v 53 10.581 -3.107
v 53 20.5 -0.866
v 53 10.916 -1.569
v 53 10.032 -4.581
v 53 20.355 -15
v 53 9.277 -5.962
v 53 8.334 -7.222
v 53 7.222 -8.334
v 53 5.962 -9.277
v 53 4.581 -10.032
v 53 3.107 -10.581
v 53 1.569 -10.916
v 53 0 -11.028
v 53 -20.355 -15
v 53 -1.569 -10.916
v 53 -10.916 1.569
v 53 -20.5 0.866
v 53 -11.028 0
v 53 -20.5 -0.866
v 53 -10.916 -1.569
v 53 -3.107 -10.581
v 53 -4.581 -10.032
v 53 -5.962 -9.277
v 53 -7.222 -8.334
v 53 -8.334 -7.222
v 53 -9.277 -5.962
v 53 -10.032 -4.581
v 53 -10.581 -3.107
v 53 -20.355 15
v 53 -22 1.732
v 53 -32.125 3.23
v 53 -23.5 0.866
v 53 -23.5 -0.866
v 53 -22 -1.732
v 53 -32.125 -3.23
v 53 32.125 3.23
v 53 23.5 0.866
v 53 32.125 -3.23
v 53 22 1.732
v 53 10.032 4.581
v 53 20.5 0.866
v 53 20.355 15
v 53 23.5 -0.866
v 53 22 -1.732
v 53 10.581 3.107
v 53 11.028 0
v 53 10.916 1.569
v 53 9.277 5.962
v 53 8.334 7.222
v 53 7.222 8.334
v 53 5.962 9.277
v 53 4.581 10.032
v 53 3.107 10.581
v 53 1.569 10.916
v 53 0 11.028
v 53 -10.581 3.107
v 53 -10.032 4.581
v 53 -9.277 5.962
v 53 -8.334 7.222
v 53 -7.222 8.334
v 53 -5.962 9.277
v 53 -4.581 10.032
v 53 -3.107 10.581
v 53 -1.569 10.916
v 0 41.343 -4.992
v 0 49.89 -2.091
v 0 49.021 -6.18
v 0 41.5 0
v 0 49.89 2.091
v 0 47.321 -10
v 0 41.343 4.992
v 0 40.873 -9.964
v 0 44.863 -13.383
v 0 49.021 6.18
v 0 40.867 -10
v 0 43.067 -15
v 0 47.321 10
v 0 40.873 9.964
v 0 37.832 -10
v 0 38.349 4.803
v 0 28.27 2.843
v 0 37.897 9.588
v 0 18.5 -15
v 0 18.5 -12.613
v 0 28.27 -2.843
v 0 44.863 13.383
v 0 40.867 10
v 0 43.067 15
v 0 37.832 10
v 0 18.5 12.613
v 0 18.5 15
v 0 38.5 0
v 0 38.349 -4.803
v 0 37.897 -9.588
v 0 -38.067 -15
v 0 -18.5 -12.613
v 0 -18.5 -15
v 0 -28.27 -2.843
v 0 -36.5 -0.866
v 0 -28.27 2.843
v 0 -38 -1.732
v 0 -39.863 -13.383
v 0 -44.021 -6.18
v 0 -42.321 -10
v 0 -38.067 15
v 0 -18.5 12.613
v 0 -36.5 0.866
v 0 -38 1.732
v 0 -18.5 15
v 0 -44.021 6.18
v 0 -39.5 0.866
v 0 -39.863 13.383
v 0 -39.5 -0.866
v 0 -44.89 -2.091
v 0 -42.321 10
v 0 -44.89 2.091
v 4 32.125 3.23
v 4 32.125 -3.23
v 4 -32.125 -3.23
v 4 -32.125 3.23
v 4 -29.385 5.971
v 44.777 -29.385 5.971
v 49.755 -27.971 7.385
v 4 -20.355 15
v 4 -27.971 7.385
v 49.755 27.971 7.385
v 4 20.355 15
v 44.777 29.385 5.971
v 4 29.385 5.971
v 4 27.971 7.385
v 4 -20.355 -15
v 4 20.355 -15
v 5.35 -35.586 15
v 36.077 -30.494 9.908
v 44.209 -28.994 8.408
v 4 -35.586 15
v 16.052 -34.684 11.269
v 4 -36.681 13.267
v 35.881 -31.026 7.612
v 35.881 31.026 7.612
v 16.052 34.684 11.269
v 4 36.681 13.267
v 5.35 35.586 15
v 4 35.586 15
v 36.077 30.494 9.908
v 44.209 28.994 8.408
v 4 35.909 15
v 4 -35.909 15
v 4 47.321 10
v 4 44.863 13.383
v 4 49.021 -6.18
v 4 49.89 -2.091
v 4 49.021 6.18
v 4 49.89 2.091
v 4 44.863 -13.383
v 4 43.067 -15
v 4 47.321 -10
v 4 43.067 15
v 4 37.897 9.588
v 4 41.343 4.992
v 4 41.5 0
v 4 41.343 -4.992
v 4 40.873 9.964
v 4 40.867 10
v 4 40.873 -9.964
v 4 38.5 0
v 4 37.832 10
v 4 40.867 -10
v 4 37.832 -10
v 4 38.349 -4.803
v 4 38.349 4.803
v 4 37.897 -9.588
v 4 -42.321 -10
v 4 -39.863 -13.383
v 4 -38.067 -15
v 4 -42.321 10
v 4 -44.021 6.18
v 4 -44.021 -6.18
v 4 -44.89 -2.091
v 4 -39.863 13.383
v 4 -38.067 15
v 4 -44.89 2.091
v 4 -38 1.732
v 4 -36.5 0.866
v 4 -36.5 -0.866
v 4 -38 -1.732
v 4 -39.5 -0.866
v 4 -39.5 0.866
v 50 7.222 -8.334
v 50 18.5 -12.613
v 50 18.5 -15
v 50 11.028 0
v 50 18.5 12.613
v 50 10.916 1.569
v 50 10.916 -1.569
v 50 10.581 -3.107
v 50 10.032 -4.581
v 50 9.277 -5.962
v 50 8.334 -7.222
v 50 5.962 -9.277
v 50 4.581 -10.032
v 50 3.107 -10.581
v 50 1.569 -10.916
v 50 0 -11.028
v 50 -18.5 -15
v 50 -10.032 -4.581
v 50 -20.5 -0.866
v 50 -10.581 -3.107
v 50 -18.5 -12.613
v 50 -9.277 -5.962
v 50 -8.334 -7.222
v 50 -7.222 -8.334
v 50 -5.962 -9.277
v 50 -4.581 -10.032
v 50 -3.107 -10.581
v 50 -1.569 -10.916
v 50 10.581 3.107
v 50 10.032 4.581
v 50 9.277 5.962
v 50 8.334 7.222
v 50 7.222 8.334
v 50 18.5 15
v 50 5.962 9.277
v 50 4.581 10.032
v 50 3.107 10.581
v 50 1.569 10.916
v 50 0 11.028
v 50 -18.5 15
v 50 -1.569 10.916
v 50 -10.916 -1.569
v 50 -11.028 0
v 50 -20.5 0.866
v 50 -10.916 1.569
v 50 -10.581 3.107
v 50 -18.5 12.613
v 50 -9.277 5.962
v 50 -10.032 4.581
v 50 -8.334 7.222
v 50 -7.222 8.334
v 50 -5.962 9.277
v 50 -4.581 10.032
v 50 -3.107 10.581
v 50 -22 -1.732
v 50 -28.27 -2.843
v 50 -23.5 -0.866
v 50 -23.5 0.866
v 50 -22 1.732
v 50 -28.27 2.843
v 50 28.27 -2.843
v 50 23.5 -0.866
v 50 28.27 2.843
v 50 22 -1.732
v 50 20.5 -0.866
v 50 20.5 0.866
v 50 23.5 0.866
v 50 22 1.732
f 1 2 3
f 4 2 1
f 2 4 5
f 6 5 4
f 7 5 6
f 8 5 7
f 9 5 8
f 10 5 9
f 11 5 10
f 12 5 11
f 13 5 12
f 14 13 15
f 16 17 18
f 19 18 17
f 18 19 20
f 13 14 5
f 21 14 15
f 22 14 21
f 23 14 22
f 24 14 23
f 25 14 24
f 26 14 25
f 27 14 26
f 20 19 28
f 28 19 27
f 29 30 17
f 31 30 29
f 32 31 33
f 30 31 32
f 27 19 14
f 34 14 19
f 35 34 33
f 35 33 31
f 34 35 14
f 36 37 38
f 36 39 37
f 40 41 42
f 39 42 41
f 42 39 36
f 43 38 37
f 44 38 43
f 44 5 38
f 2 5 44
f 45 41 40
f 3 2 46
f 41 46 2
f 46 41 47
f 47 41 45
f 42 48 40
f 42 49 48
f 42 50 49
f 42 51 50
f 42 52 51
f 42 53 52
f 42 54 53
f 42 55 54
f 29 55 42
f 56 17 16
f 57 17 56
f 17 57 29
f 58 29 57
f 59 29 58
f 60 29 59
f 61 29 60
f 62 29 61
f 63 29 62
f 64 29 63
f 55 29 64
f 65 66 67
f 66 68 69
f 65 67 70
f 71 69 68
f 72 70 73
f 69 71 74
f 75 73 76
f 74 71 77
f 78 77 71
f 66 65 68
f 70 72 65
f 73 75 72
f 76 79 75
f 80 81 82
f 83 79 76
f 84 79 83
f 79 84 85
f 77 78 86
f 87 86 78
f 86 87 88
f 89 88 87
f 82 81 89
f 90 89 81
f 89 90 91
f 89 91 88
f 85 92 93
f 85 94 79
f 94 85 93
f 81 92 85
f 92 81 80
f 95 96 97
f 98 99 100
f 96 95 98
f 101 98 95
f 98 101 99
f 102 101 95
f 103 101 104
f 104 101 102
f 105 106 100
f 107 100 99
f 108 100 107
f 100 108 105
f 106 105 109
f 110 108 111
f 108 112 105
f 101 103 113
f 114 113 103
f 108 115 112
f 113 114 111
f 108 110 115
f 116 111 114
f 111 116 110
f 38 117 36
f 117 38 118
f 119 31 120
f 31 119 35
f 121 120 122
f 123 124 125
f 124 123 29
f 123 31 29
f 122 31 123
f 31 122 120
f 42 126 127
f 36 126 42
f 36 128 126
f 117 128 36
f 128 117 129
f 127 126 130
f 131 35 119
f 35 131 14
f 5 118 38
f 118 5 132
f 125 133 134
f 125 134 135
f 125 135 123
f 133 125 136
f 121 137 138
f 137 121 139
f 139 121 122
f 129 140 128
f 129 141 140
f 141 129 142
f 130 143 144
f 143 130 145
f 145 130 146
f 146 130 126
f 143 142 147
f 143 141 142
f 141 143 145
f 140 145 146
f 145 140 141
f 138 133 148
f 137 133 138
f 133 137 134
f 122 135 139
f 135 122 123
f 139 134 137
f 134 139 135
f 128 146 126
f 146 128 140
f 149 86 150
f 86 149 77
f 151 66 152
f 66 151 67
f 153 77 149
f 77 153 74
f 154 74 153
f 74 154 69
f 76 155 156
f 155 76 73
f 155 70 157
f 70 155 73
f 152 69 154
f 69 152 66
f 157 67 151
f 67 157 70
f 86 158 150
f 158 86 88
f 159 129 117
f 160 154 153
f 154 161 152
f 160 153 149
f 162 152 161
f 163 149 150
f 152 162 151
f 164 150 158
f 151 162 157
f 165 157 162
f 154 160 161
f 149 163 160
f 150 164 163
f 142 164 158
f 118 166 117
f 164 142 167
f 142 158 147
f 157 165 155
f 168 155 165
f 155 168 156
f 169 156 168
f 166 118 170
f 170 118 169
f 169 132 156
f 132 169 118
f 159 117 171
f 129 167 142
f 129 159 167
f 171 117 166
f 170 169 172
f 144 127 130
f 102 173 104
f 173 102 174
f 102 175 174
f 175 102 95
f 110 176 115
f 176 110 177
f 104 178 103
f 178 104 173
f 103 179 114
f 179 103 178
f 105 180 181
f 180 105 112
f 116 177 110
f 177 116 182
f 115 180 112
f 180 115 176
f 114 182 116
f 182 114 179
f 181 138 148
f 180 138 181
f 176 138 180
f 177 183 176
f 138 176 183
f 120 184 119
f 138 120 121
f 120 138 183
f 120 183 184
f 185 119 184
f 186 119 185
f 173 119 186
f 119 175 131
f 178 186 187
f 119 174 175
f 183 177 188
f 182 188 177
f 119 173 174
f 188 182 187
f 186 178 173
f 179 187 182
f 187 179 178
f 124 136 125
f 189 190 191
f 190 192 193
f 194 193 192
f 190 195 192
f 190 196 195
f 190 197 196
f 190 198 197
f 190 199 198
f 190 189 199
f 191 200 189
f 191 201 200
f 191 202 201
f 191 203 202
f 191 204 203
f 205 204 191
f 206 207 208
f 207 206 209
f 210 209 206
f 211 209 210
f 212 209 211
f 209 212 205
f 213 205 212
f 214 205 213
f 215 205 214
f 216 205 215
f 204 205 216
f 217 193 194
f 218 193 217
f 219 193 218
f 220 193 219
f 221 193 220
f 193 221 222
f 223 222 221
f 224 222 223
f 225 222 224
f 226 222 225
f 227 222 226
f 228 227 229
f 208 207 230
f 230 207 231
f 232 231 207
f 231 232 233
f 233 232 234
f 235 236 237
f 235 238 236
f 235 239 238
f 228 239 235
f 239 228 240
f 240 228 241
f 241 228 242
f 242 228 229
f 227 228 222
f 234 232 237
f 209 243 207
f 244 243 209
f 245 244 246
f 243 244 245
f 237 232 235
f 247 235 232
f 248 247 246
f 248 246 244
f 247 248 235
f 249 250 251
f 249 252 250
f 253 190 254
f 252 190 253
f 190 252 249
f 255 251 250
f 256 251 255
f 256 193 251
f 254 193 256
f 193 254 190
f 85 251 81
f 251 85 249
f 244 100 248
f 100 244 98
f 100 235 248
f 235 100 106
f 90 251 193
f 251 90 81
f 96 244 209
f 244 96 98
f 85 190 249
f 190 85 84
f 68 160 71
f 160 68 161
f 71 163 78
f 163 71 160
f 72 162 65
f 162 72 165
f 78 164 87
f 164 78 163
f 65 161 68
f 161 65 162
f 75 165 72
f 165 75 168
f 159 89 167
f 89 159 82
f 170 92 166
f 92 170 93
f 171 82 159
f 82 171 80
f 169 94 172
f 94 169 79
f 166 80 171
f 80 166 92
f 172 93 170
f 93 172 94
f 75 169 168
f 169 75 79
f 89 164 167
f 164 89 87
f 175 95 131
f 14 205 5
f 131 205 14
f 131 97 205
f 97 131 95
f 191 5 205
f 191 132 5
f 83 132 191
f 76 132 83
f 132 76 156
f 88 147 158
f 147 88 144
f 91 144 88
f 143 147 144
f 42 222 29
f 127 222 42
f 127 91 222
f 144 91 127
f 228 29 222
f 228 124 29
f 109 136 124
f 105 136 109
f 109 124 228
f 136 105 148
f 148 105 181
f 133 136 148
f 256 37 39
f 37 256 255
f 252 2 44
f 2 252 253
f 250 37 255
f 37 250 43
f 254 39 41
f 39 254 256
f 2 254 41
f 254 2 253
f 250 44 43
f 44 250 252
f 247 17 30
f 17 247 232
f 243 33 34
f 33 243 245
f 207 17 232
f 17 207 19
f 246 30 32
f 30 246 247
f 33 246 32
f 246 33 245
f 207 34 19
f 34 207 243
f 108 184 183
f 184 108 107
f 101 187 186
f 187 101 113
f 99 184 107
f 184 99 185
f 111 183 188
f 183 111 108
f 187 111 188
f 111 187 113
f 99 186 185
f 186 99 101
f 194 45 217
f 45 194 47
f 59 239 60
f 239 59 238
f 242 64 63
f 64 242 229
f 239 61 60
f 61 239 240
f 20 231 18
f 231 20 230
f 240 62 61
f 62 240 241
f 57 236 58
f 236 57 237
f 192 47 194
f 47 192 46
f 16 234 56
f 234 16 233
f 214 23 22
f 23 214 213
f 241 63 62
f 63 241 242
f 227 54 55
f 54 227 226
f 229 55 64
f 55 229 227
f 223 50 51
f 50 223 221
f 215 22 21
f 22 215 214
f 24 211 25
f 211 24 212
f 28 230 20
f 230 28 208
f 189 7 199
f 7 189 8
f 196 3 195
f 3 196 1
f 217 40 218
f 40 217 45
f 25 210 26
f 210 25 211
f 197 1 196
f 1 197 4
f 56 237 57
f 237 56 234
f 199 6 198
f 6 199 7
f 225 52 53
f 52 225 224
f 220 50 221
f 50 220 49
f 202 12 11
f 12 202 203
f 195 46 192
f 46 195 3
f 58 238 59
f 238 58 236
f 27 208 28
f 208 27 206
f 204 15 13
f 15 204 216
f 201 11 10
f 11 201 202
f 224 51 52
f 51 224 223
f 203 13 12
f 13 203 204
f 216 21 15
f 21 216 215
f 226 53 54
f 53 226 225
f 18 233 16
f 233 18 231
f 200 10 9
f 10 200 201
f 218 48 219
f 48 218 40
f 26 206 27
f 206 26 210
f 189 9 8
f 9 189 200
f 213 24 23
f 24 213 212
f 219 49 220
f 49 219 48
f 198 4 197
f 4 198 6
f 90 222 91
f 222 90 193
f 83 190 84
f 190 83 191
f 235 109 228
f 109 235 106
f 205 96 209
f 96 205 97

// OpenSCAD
//---------------------------------------------------------------------------------------------------
// RepRap "Morgan", main ver 1.20 - Single extruder version
// Copyright 2012, 2013. Author: Quentin Harley (qharley)
// This original design is licensed under GPLv2.
//
// These are the main SCARA arm components

include <MCAD/teardrop.scad>
include <MCAD/polyholes.scad>
include <MCAD/nuts_and_bolts.scad>

LMxUU = 8;				// Choose linear bearing: 8 or 12mm
rodspacing = 175;		// Distance between rods:	175 standard, 190 wide
PVC_pipe_OD = 32;		// Default 32mm
PVC_pipe_ID = 27.5;	// measure pipe ID to adjust
Drive_pipe_OD = 22.5;	// Drive pipe outter diameter: 22mm default
THREADLESS = false;	// True for use of threadless ball screw in z-bracket
SUPPORTED_ROD = true;	// Rods held by Z-mounts - False for platform mounted (lasercut)
Leadnut_thread = false;// Apply the thread of the leadscrew nut to the Z coupler

ENVELOPE_CHECK = false;

MakeMorgan(05);		// Select Part number to make	

//MorganEndstopZ();
//***********************************************************
//**                                                			**
//**    Select the number of the module to make				**
//**																		**
//**	01:	 PVC pipe support A (Ported, 458.5mm pipe)			**
//**	02:	 PVC pipe support B (non Ported, 451.5mm pipe)		**
//**	03: Z-mount Bottom												**
//**	04: Z-mount Top													**
//**	05: Motormount Short											**
//**	06: Motormount Tall											**
//**	07: Rod mounted Drivewheel									**
//**	08: Tube mounted Drivewheel									**
//**	09: 22mm Tube 6805 bearing adaptor							**
//**	10: Bed arm Left												**
//**	11: Bed arm Right												**
//** 	12:	 Bed Z-bracket and lead screw holder					**
//**	13: Bed rear mounting clips									**
//**	14: Bed front mounting clips									**
//**	15: hall-endstop holders										**
//**	16: Z-Lead screw motor shaft coupler						**
//**	17: Arm PSI A (inner supporting arm)						**
//**	18: Arm PSI B (outer supporting arm)						**
//**	19: Arm Theta A (inner steering arm)						**
//**	20: Arm Theta B (outter steering arm)						**
//**	21: Morgan Tool head (make from ABS/Nylon/etc)		**
//**	22: Lead screw nut (Alpen 8mm SDS)	
//**	23: extruder Bowden adaptor
//**  24: Belt anchor clip
//
//**  25: Morgan Line wheel (Rod mount)
//**  26: Morgan Line Wheel (Tube mount)				
//**
//**  TO DO!  Build Plates...
//**		Select number of build plate
//**	50: Arms Plate 		(PLA)
//**	51: Bed Plate 1		(PLA)
//**	52: Bed Plate 2		(PLA)
//**	55: Wheel PlateA	(PLA)
//**	56: Wheel PlateB	(PLA)
//**	60: Diverse Plate	(ABS)



module MakeMorgan(partnumber)
{
	if (partnumber == 1 ){
		MorganPVCsupport_ANG(PVC_pipe_ID,130,130,420, pipe = false, port=true);	// 458.47
	}
	if (partnumber == 2 ){
		MorganPVCsupport_ANG(PVC_pipe_ID,70,150,420, pipe = false);					// 451.44
	}
	
  rotate([0,0,45]){ 					// parts rotated through 45deg to ease fitting to RepRap heatbed


//MorganPillarMount();
//MorganShaftMount();
	if (partnumber == 3 ){
		if (SUPPORTED_ROD){
			MorganZmountBot(rodspacing, LMxUU);
		}
		else {
			MorganShaftMount();
		}		
	}
	if (partnumber == 4 ){
		if (SUPPORTED_ROD){
			MorganZmountTop(rodspacing, LMxUU);
		}
		else {
			MorganPillarMount();
		}	
		
	}

  }

	if (partnumber == 5 ){
		MorganMotorMount4(Height = 50);
	}
	if (partnumber == 6 ){
		mirror()
			MorganMotorMount4(Height = 70);
	}
	if (partnumber == 7 ){
		MorganBeltWheel();			// Rod mounted belt drive wheel
	}
	if (partnumber == 25 ){
		MorganLineWheel();			// Rod mounted line drive wheel
	}
	if (partnumber == 8 ){
		MorganBeltWheel2();			// Tube mounted belt drive wheel
	}
	if (partnumber == 26 ){
		MorganLineWheel2();			// Tube mounted line drive wheel
	}
	if (partnumber == 9 ){
		MorganPillar();				// 6805 bearing tube mount
	}
	
  rotate([0,0,45]){

	if (partnumber == 10 ){
		if(LMxUU == 12)
			MorganBedarmLeft(21.5);
		else
			MorganBedarmLeft(15.5);
	}
	if (partnumber == 11 ){
		if(LMxUU == 12)
			MorganBedarmRight(21.5);
		else
			MorganBedarmRight(15.5);
	}
	if (partnumber == 12 ){
		//Bed_stabil_bracket(21.5);
		if(LMxUU == 12)
			Bed_stabil_bracket(21.5);
		else
			Bed_stabil_bracket(15.5);
	}

  }

	if (partnumber == 13 ){
		BedMountRear();
	}
	if (partnumber == 14 ){
		BedMountFront();
	}
	
	if (partnumber == 15 ){
		MorganEndstop();
	}

	if (partnumber == 16 ){
		rotate([0,0,45])
			MorganZCoupler();
	}
	if (partnumber == 17 ){
		Primary_Arm();
	}
	if (partnumber == 18 ){
		Secondary_Arm();
	}
	if (partnumber == 19 ){
		Sup_Arm1();
	}	
	if (partnumber == 20 ){
		Sup_Arm2();
	}
	if (partnumber == 21 ){
		//Secondary_Arm_hotend_holder_mk2(Hotend_D = 16.5, Hotend_H = 12);
		Secondary_Arm_hotend_holder_mk2(Hotend_D = 16.5, Hotend_H = 12+25,mountpiece = true);
	}
	if (partnumber == 22 ){
		leadscrew_nut();
	}
	if (partnumber == 23 ){
		Extruder_Bowden_adaptor(support = false);
	}
	if (partnumber == 24 ){
		belt_clip();;
	}

	
//**************** Plates  ***************************

	if (partnumber == 50 ){
		translate([0,0,0])
			Primary_Arm();
		translate([0,35,0])
			Secondary_Arm();
		translate([0,-35,0])
			Sup_Arm1();
		translate([0,73,0])
			Sup_Arm2();
		
	}

	if (partnumber == 51 ){
		rotate([0,0,45]){
			translate([-13,0,0])
				if(LMxUU == 12)
					MorganBedarmLeft(21.5);
				else
					MorganBedarmLeft(15.5);

			translate([13,0,0])
				if(LMxUU == 12)
					MorganBedarmRight(21.5);
				else
					MorganBedarmRight(15.5);
		}

		translate([0,60,0])
			BedMountRear();
		translate([-40,150,0])
			rotate([0,0,180])
				BedMountRear();

		translate([-120,50,15/2])
			BedMountFront();
		translate([-120,20,15/2])
			BedMountFront();

	}


	if (partnumber == 60 ){
		translate([0,0,0])
			rotate([0,0,0])
				Secondary_Arm_hotend_holder(Hotend_D = 16.5, Hotend_H = 12);

		translate([70,-10,0])
			rotate([0,0,180])
				MorganPVCsupport_ANG(26.5,130,130,420, pipe = false, port=true);	// 458.47
	
		translate([-40,0,0])
			rotate([0,0,180])
				MorganPVCsupport_ANG(26.5,130,130,420, pipe = false, port=true);	// 458.47

		translate([-50,40,0])
			rotate([0,0,0])
				MorganPVCsupport_ANG(26.5,70,150,420, pipe = false);					// 451.44
		
		translate([-50,-70,0])
			rotate([0,0,0])
				MorganPVCsupport_ANG(26.5,70,150,420, pipe = false);					// 451.44

		translate([-70,-40,0])
			rotate([0,0,0])
				Extruder_Bowden_adaptor(support = false);

		translate([40,-35,0])
			rotate([0,0,0])
				import("../stl/cap_2.stl");

		translate([-40,-35,0])
			rotate([0,0,0])
				import("../stl/cap_2.stl");

		translate([-30,50,0])
			rotate([0,0,0])
				import("../stl/Eckstruder_Big_Gear_Herringbone.stl");

		translate([-16,-35,20])
			rotate([0,0,0])
				import("../stl/Eckstruder_Small_Gear_Herringbone.stl");

		translate([-50,-25,0])
			rotate([0,0,-90])
				import("../stl/Eckstruder_Idler_Block_for_Prusa.stl");

		translate([50,-65,0])
			rotate([0,0,0])
				import("../stl/thumb_knob_M4_extruder.stl");

		translate([10,110,0])
			rotate([0,0,-90])
				import("../stl/Eckstruder_Block_for_Prusa.stl");

	}

}





// **********************************************************
// **  Here be dragons...

//** print envelope check - only in F5 review
if(ENVELOPE_CHECK){
	translate([0,0,50])
		%cube([200,200,100], center=true);
}

module Matrix_test()
{
	for(x=[0:9])
	{
		for (y=[0:9])
		{
			translate([20*x,20*y,1.5])
				difference(){
					cube([20,20,3], center=true);
					cube([19,19,3],center=true);
				}
		}
	}	
}



PipeFactor = 40/39.2;			// Multiplication factor for inner diameter 

//MorganFrame();

pipeselect = false; // Show pipes in frame... default false


// ************** Building Blocks *************
// MorganPillarMount();
//	MorganShaftMount();
// MorganBedarm_mount();
//Bed_stabil_clasp();

// *****************8***********
//MorganMotorMount(50);
//MorganMotorMount(75);
//MorganFlatMotorMount();

module Dual_toohead()
{
	MakeMorgan(21);		// Select Part number to make	

	translate([150,0,0])
		rotate([0,0,12])
			translate([-150,0,0])
				rotate([0,0,90-(12/2)])
					Secondary_Arm_hotend_holder_2(Hotend_D = 16.5, Hotend_H = 12);
	translate([0,0,27])
		rotate([0,0,50])
			#MakeMorgan(20);
	translate([0,0,2])
		#MakeMorgan(18);
}

module leadscrew_profile()
{
	projection(cut=false){
		//polyhole(5,5);
		cylinder(r=3, h=5, $fn=24);
		cube([7.5, 3,1], center=true);
		rotate([0,0,-45])
			cube([6.5,3,1],center = true);
	}
}

module leadscrew_nut(){
	difference(){
		union(){
			cylinder(r=14.8/2,h=14, $fn=6);

		}
		linear_extrude(height = 120/4, center = true, twist = -360)
			scale(1.1)
				leadscrew_profile();
	}

}

module belt_clip($fn = 100)		// Adapted from code by WJ Harley
{
	difference()	{
		translate([0,0,0])	
			cylinder(10,30,30,0);
		union()
		{	
			translate([-17,-30,-1])
				cube([50,65,12]);
			translate([0,0,-0.2])	
				cylinder(12,r=27.5);
			translate([-35,-2,1.5])
				cube([30,4,7]);
		}
	}

	translate([-29,2,0])
		cube([12,2,10]);
	translate([-29,-4,0])
		cube([12,2,10]);
	translate([-22,2.5,0]){
		rotate(45,[0,0,1])
		cube([2,8,10]);
	}
	translate([-28,-8,0]){
		rotate(-45,[0,0,1])
		cube([2,8,10]);
	}
	translate([-17.5,2,0])	
		cylinder(10,0.5,0.5,0);
	translate([-17.5,-2,0])	
		cylinder(10,0.5,0.5,0);
}
		

		


module MorganEndstop()
{
	difference(){
		union(){
			cylinder(r=6, h=10);

			translate([9,0,1.5])
				minkowski(){
					cube([17,8,3],center=true);
					cylinder(r=2, h=0.00001, $fn=12);
				}

			translate([-5,1,5])
				rotate([90,0,0])
					minkowski(){
						cube([7,6,12],center=true);
						cylinder(r=2, h=2, $fn=12);
					}


		}

		translate([0,0,-1])
			polyhole(12,8);

		translate([-12,0,5])
			cube([20,8,12],center=true);

		translate([15,0,1])
			cube([4,5,2.1], center=true);
		translate([12,0,2.1])
			cube([4,5,2], center=true);

		translate([-6,10,5])
			rotate([90,0,0])
				polyhole(20,3);

		translate([-6,11,5])
			rotate([90,0,0])
				cylinder(r=3.1, h=5, $fn =6);



	}

}


module MorganEndstopZ()
{
	difference(){
		union(){
			cylinder(r=6, h=10);

			translate([8,0,0])
			  rotate([0,-90,0])
				difference(){
					translate([9,0,1.5])
						minkowski(){
							cube([17,8,3],center=true);
							cylinder(r=2, h=0.00001, $fn=12);
						}

					translate([15,0,1])
						cube([4,5,2.1], center=true);
					translate([12,0,2.1])
						cube([4,5,2], center=true);
				}

				translate([-5,1,5])
					rotate([90,0,0])
						minkowski(){
							cube([7,6,12],center=true);
							cylinder(r=2, h=2, $fn=12);
						}


		}

		translate([0,0,-1])
			polyhole(12,8);

		translate([-12,0,5])
			cube([20,8,12],center=true);

		translate([-6,10,5])
			rotate([90,0,0])
				polyhole(20,3);

		translate([-6,11,5])
			rotate([90,0,0])
				cylinder(r=3.1, h=5, $fn =6);



	}

}


module MorganF(){

		MorganPVCsupport_ANG(29,130,130,420, pipe = pipeselect);		// 458.47
	translate([50,0,0])
		MorganPVCsupport_ANG(29,70,150,420, pipe = pipeselect);			// 451.44
	

}

module MorganFrame(){

	translate([0,0,-4])	
		cube([360,360,8],center = true);
	translate([0,0,0])
		MorganZmountBot();

	translate([150,0,0])
		MorganPVCsupport_ANG(29,-130,130,420, pipe =pipeselect);
	translate([-150,0,0])
		MorganPVCsupport_ANG(29,130,130,420, pipe = pipeselect);
	
	translate([70,150,0])
		MorganPVCsupport_ANG(29,70,-150,420, pipe = pipeselect);
	translate([-70,150,0])
		MorganPVCsupport_ANG(29,-70,-150,420, pipe = pipeselect);

	translate([-180,-40,420])
		cube([360,220,8]);

	translate([0,0,420])
		rotate([0,180,0])
		{
			MorganZmountTop();

			translate([140,0,0])
				MorganPVCsupport_ANG(29,-70,150,420, pipe = pipeselect);
			translate([-140,0,0])
				MorganPVCsupport_ANG(29,70,150,420, pipe = pipeselect);
			translate([20,130,0])
				MorganPVCsupport_ANG(29,130,-130,420, pipe = pipeselect);
			translate([-20,130,0])
				MorganPVCsupport_ANG(29,-130,-130,420, pipe = pipeselect);
		}
}

module BedMountFront()
{
  rotate([0,90,0])	
	difference(){
		cube([15,25,25], center=true);
		translate([0,0,6.5])
			rotate([0,90,0])
				cylinder(r=15/2, h=20, center=true);	
		difference(){
			translate([0,0,6.5])
				rotate([0,90,0])
					cylinder(r=15/2+3, h=20, center=true);
			translate([0,0,6.5])
				rotate([0,90,0])
					cylinder(r=15/2+2, h=20, center=true);
			translate([0,0,19])
				cube([15,25,25],center=true);
		}
			
		cube([15,10,10],center=true);
		translate([0,0,10])
			cube([15,12,10],center=true);

		rotate([0,-90,0])
		#teardrop(2.6,30,90);


	}
}


module Bed_stabil_bracket(bsize = 15.5){
	difference(){
		union(){
			translate([(rodspacing)/2,0,0])
				Bed_stabil_clasp(bsize);
			translate([(rodspacing)/-2,0,0])
				mirror(){
					Bed_stabil_clasp(bsize);
				}
			difference(){
			  union(){
				translate([0,-14.5,25]){
					cube([rodspacing,3,50],center=true);
						
				}
			
				//translate([rodspacing/2,-12,0])
				//	rotate([0,0,-160])
				//		#cube([rodspacing/2, 3, 50]);
				//mirror()
				//	translate([rodspacing/2,-12,0])
				//		rotate([0,0,-160])
				//			cube([rodspacing/2, 3, 50]);

				translate([0,-25.5,1.5]){
					intersection(){
						cube ([rodspacing+20, 25, 3],center=true);
						translate([0,rodspacing*1.5-6,-2])	
							cylinder(r=rodspacing*1.5, h=5, $fn = 50);

					}			
				}
			  }
		
			  translate([rodspacing/2,0,0])
					cylinder(r=bsize*0.8, h=50);
			  translate([rodspacing/-2,0,0])
					cylinder(r=bsize*0.8, h=50);	
			}		

	
			cylinder(r=22,h=50);

			// Lead screw add section
			if (THREADLESS){

			}
			else{
				translate([0,-40,0])
				cylinder(r=11,h=50,$fn=6);

			translate([0,-20,5])
				cube([22,40,10],center=true);
			}
		}

		cylinder(r=19,h=50);
		translate([-25,-13,0])
		cube([50,50,50]);

		translate([45,-30,22])
			rotate([0,0,90])
				teardrop(16, 50, 90);
				
		translate([-45,-30,22])
			rotate([0,0,90])
				teardrop(16, 50, 90);
				
		// Lead screw subtraction section
		if (THREADLESS){

		}
		else {
			translate([0,-40,0])
				cylinder(r=8,h=6,$fn=6);
			translate([0,-40,9])
				cylinder(r=8,h=41,$fn=6);
			translate([0,-40,6.5])
				cylinder(r=4.5, h=10);
		}	

		// Magnet hole
		translate([rodspacing/-2+LMxUU/1.5, LMxUU*-1.756, 0])
			polyhole(3,5);//r=2.5, h=3);
	
	}
}

module Bed_stabil_clasp(bsize=15.5){
	difference(){
		
		cylinder(r=bsize/2+8, h=50);
		translate([0,0,2])
			MorganBedarmRight(bsize);
		cylinder(r=bsize/1.9,h=50);
		translate([0,bsize*.75,25])
			cube([bsize*3,bsize*1.5,52],center=true);
	}
}


module BedMountRear(){
  translate([0,0,0])
    rotate([0,270,0])
	difference(){
		union(){
			translate([0,0,0])
				cube([18,60,4]);
			translate([0,70,19.5])
				rotate([0,90,0])
					polyhole(18,25);
			translate([0,60,0])
				rotate([60,0,0])
					cube([18,20,6]);
		}
		translate([-1,70,19.5])
			rotate([0,90,0])
				polyhole(22,15.5);
		translate([-1,70,19.5])
			rotate([60,0,0])	
				translate([4.5,10,0])
					cube([32,20,15.5],center=true);
		translate([9,6,0])
			polyhole(5,4);
		translate([9,14,0])
			polyhole(5,4);
	}
}



module MorganBedScrewmount(){
  
  difference(){
	union(){
		translate([25,22,0])
			ArmEndPiece();
		translate([25,0,2])
			cube([18,68,4],center=true);
		translate([25,-5,12])
			cube([4,74,24],center=true);

		translate([-25,22,0])
			ArmEndPiece();
		translate([-25,0,2])
			cube([18,68,4],center=true);
		translate([-25,-5,12])
			cube([4,74,24],center=true);
	
		translate([0,-42,2])
			cube([68,18,4],center=true);
		translate([0,-42,12])
			cube([54,4,24],center=true);
		translate([0,-42,0])
			cylinder(r=10,h=24,$fn=50);
	}
	translate([0,-42,17])
		cylinder(r=7.5,h=7,$fn=6);
	translate([0,-42,0])
		cylinder(r=8,h=15,$fn=6);
	translate([0,-42,15.4])
		cylinder(r=5,h=15,$fn=50);

	translate([-50,22,12])
		rotate([0,90,0])
			polyhole(100,15.5);

	polyhole(20,36);
  }
}

module ArmEndPiece(){
	difference(){
		union(){
			

			translate([-9,0,12])
				rotate([0,90,0])
					cylinder(r=12,h=18,$fn=50);
			translate([0,6,12])
				cube([18,12,24],center=true);
			
		}
		
		translate([-10,0,12])
				rotate([0,90,0])
					polyhole(20,15.5);

	}
}

module MorganBedarm_mount(){
	difference(){
		cylinder(r=12,h=3*24,$fn=50);
		polyhole(3*24,15.5);
		translate([13,0,0])
			cylinder(r=9.2,h=3*24,$fn=50);
		
		

	}
	rotate([0,0,-45])
		translate([9.85,0,0])
			cylinder(r=2.15,h=3*24, $fn=50);
	rotate([0,0,45])
		translate([9.85,0,0])
			cylinder(r=2.15,h=3*24, $fn=50);

	translate([0,0,4])
		difference(){
			rotate_extrude(convexity = 10)
				translate([8.4, 0, 0])
					circle(r = 1, $fn = 100);
			translate([5,0,0])
				cube([10,10,2], center=true);
		}

	translate([0,0,(3*24)-4])
		difference(){
			rotate_extrude(convexity = 10)
				translate([8.4, 0, 0])
					circle(r = .8, $fn = 100);
			translate([5,0,0])
				cube([10,10,2], center=true);
		}

}

module MorganBedarm_mount12(bearingD = 21){
	
	bearingR = bearingD / 2;

	subcyl = sqrt(pow((bearingR+4.25),2)/2);

	difference(){
		cylinder(r=bearingR + 4.25,h=3*24,$fn=50);
		polyhole(3*24,bearingD);
		translate([bearingR+4.25,0,0])
			cylinder(r=subcyl,h=3*24,$fn=50);
		
		

	}
	rotate([0,0,-45])
		translate([bearingR+2.25,0,0])
			cylinder(r=2.25,h=3*24, $fn=50);
	rotate([0,0,45])
		translate([bearingR+2.25,0,0])
			cylinder(r=2.25,h=3*24, $fn=50);

	translate([0,0,6])
		difference(){
			rotate_extrude(convexity = 10)
				translate([bearingR, 0, 0])
					circle(r = .8, $fn = 100);
			translate([8,0,0])
				cube([bearingD*.66,bearingD*.66,2], center=true);
		}

	translate([0,0,44.5+6])
		difference(){
			rotate_extrude(convexity = 10)
				translate([bearingR, 0, 0])
					circle(r = .8, $fn = 100);
			translate([8,0,0])
				cube([bearingD*.66,bearingD*.66,2], center=true);
		}

}

module MorganBedarm(){

	
	difference(){
		union(){
			translate([0,100,2])
				cube([18,200,4],center=true);
			translate([0,100,3*24/2])
				cube([5,200,3*24],center=true);
			
			
			translate([-9,25,12])
				rotate([0,90,0])
					cylinder(r=12,h=18,$fn=50);
		}

		cylinder(r=11.5,h=100);
		translate([0,75,87.50])
			rotate([0,90,0])
				cylinder(r=65,h=20,center=true);
		translate([0,175,72.5])
			cube([20,200,100],center=true);

		translate([-9,25,12])
				rotate([0,90,0])
					polyhole(18,15.5);

		translate([-9,188,12])
				rotate([0,90,0])
					polyhole(20,15.5);
		
	}
	
	
	
	difference(){
		union(){
			translate([-9,188,12])
				rotate([0,90,0])
					cylinder(r=12,h=18,$fn=50);
			translate([0,194,12])
				cube([18,12,24],center=true);
		}
		
		translate([-10,188,12])
				rotate([0,90,0])
					polyhole(20,15.5);

	}
	
}

module MorganBedarmLeft(bsize = 15.5){

	MorganBedarm_mount12(bsize);
	MorganBedarm();
	
}


module MorganBedarmRight(bsize = 15.5){

	rotate([0,0,180])
		MorganBedarm_mount12(bsize);

	MorganBedarm();
	
}


module Motor(MotorH = 50, MotorW = 42){
	translate([0,0,MotorH/2])
		intersection(){
			cube([MotorW*1.285,MotorW*1.285,MotorH],center=true);
			rotate([0,0,45])
				cube([MotorW,MotorW,MotorH],center=true);
		}

}

module MorganFlatMotorMount(){
	difference(){
		Motor(3);
		for(i=[0,90,180,270]){
			rotate([0,0,i])
			{
				translate([33,0,Height-8])
					polyhole(12,2);

				translate([22,0,0])
					polyhole(10,3);
			}
		}
		polyhole(2,22);
	}
}

module MorganMotorMounts_mk5_dxf(){
	for (a=[0:5]){
		//for (b=[0:3]){
			translate([a*50,0,0])
				rotate([0,0,45]) projection(cut=true)
					translate([0,0,-4 - 4*a])
						MorganMotorMount5(25);

		//}
	}
	translate([300,0,0])
	rotate([0,0,45]) 
		projection(cut=true)
			translate([0,0,-4])
				MorganMotorMount5(4);
}

module MorganMotorMount5(height = 4){
	difference(){
		union(){
			Motor(height, 46);
			translate([0,0,2]){
				cube([80,10,4],center=true);
				cube([10,80,4],center=true);
			}
		}
		
		for (i= [0:3]){
			rotate([0,0,i*90]){
				translate([0,22,height-1.6])
					polyhole(height+2,3);
				translate([0,35,- 1])
					polyhole(height+2,3);
			}
		}
		for (i= [0:3]){
			rotate([0,0,i*90])
				translate([0,22,-2])
					polyhole(height,6);
		}
		translate([0,0,-1])
			polyhole(height+2,35);
	}	
}

module MorganMotorMount4(Height = 50, Mheight = 52){

	if (Height < Mheight+2)
	{
		echo ("Help");
	}	
	
	rotate([0,90,0])
	{
		difference(){
			
			union(){
				Motor(Height + 3, 44+6);
				translate([0,30,0])
					cylinder(r=20,h=4);
				translate([0,-25,0])
					cylinder(r=20,h=4);

				intersection(){
					union(){
						//translate([10,-32,25])
							//rotate([0,0,-45])
								//cube([13,2,50],center=true);
						mirror()
				  			translate([10,-32,25])
								rotate([0,0,-45])
									cube([13,2,50],center=true);
		
						//translate([10,32,25])
							//rotate([0,0,45])
								//cube([13,2,50],center=true);
						mirror()
				  			translate([10,32,25])
								rotate([0,0,45])
									cube([13,2,50],center=true);
					}

					cylinder(r1=40, r2=29, h=50);
				}

			}
			translate([0,0,0])
				Motor(Height, 44);
			translate([65,0,25])
				cube([100,100,100],center=true);
			translate([-65,0,25])
				cube([100,100,100],center=true);
			translate([0,22,Height - 5])
				polyhole(10,3);
			translate([0,-22,Height - 5])
				polyhole(10,3);
			translate([0,-38, 0])
				polyhole(10,3);
			intersection(){
				translate([0,25,5])
					cube([20,50,10],center=true);
				translate([0,-38,0])
					difference(){
						cylinder(r=79.5, h=10, $fn=100);
						cylinder(r=76.5, h=10, $fn=100);
					}
			}
			translate([0,0,Height - 5])
				polyhole(10,22);
			
			translate([0,0,Height/2])
				cube([37,37,Height],center=true);

		}
	} 

}


module PipeCuttingTemplate(PipeOD, ){
	difference(){	
		union(){
			cube([PipeOD*2,PipeOD+10,PipeOD/2+8]);
			cube([PipeOD, 5, PipeOD+12]);
			translate([0,PipeOD+5,0])
				cube([PipeOD, 5, PipeOD+12]);
		}
		translate([-1,PipeOD/2+5,PipeOD/2+5])
			rotate([0,90,0])
				polyhole(PipeOD*2+2,PipeOD);
		translate([PipeOD/2,-PipeOD,4])
			cube([1.5,PipeOD*3,PipeOD*2]);
		
		translate([PipeOD/4,(PipeOD+10)/2,0])
			polyhole(5,3);
		translate([PipeOD/4,(PipeOD+10)/2,2])
			cylinder(r1=1.5, r2=3.5, h=3);
		translate([PipeOD/4,(PipeOD+10)/2,5])
			polyhole(5,7);

		translate([PipeOD*1.3,(PipeOD+10)/2,0])
			polyhole(5,3);
		translate([PipeOD*1.3,(PipeOD+10)/2,2])
			cylinder(r1=1.5, r2=3.5, h=3);
		translate([PipeOD*1.3,(PipeOD+10)/2,5])
			polyhole(5,7);
		
	}
	

}

module MorganSpoolHolder(PipeOD, PipeID){

	intersection(){
		difference(){	
			union(){
				translate([0,0,PipeOD/2])
					cube([PipeOD+20,PipeOD+10,PipeOD], center = true);
				translate([-PipeOD+10,0,PipeOD/2-5])	
					rotate([0,270,0])
						cylinder(r=PipeID/2,h=25);

				translate([-PipeOD-40,0,0])	
					rotate([0,0,0]){
						cylinder(r=PipeID/2,h=25);
						cylinder(r=PipeID/1.5, h=5);
						translate([0,0,5])
							cylinder(r1=PipeID/1.5, r2=PipeID/2, h=10);
					}
			}
		
			polyhole(PipeOD*2+2,PipeOD);
			
			translate([PipeOD/1.6,PipeOD/1.2,PipeOD/3])
				rotate([90,0,0])
					polyhole(PipeOD+20, 4);

			translate([-PipeOD-40,0,0]){
				translate([0,0,20.4])
					polyhole(25, 8.5);
					//cylinder(r=4,h=25);
				cylinder(r=7.5, h=20, $fn = 6);
			}

			translate([-PipeOD+10,0,PipeOD/2-5])	
					rotate([0,270,0]){
						polyhole(25, 8.5);
						//cylinder(r=4,h=25);
						translate([0,0,-7])
						cylinder(r=7.5, h=20, $fn = 6);
					}
			
			translate([PipeOD / 2,0,PipeOD/2])
				cube([PipeOD, PipeOD - 2, PipeOD],center=true);
			translate([0,0,-PipeOD])
				cube([300,300,PipeOD*2],center=true);
			translate([0,0,+PipeOD*1.85])
				cube([300,300,PipeOD*2],center=true);
		
		}
		translate([PipeOD+10,0,PipeOD/2-5])	
				rotate([0,270,0])
					cylinder(r=PipeID/1.2,h=80+PipeOD*2);
					
	}
}


module MorganPVCsupport(PipeID = 29){

	difference(){
		union(){
			cylinder(r=(PipeID+6)/2, h=5, $fn = 100);
			cylinder(r=(PipeID)/2, h=35, $fn = 100);
			translate([0,0,35])
				cylinder(r1 = (PipeID)/2, r2=PipeID/2-1, h=3, $fn=100);	
			translate([0,0,15])
				rotate_extrude(convexity = 10, $fn = 100)
					translate([(PipeID)/2-1.5,0,0])
						circle(r=2, $fn = 20);	
		}
		translate([0,0,5])
			cylinder(r=(PipeID-4)/2, h=33, $fn=100); 
		translate([0,0,2])
			cylinder(r1=5/2, r2=9/2, h=3);
		cylinder(r=5/2,h=2);
	}

}

module MorganPVCsupport_ANG(PipeID = 29, target_x = 0, target_y = 0, target_z=1, pipe = false, port = false){

	PipeLength = sqrt (pow(target_x,2)+pow(target_y,2)+pow(target_z,2));
	echo (PipeLength);
	//hyp = sqrt( pow(target_x,2) + pow(target_z,2));
	//echo(hyp);
	

	deg_x = asin ( target_x / PipeLength);
	deg_y = -asin ( target_y / PipeLength) ;

	difference(){
		union(){
			cylinder(r=(PipeID+2)/2, h=5, $fn = 100);
			rotate([deg_y,deg_x,0]){
				
				difference(){
					union(){
						translate([0,0,-10])
							cylinder(r=(PipeID+6)/2, h=20, $fn = 100);
					
					// shaft body
						cylinder(r=(PipeID)/2, h=35, $fn = 100);
						translate([0,0,35])
							cylinder(r1 = (PipeID)/2, r2=PipeID/2-1, h=3, $fn=100);	

					// m4 trapped nut support
					//	translate([0,0,4])
					//		cylinder(r = 4, h=3, $fn = 6);

					// Rib anchor
						translate([0,0,30])
							rotate_extrude(convexity = 10, $fn = 100)
								translate([(PipeID)/2-1.5,0,0])
									circle(r=2, $fn = 20);	

							translate([0,0,15])
							rotate_extrude(convexity = 10, $fn = 100)
								translate([(PipeID)/2-1.5,0,0])
									circle(r=2, $fn = 20);	
						
					}
					translate([0,0,-5])
						cylinder(r=(PipeID-5)/2, h=45, $fn=100); 
				}
				
			}

				// m4 trapped nut support
				//		translate([0,0,4])
				//			cylinder(r = 6, h=3, $fn = 6);
		}
			
		
		// m4 trapped nut
		translate([0,0,3])
			//cylinder(r1=5/2, r2=9/2, h=3);
			cylinder(r=8.2/2, h=5, $fn=6);
			
			
		cylinder(r=4/2,h=10, $fn = 20);

		translate([0,0,-10])
			cylinder(r= PipeID, h=20, center = true);

		if (port == true){
			translate([0,0,0])
				rotate([0,0,225])
					translate([PipeID/2,0,6])
						teardrop(5, PipeID/1.8, 90);
						

		}
		
	}

	if (pipe == true){
		rotate([deg_y, deg_x, 0])
			translate([0,0,10])
			%cylinder(r=33/2, h=PipeLength-20);
	}

}


module HoleCal(){
	difference(){
		cylinder(r=25, h=3, $fn=200);
		polyhole(3, 40);
		translate([0,0,3])
			rotate([45,0,0])
				cube([60,1,1],center=true);
		translate([0,0,3])
			rotate([0,0,90])
				cube([60,1,1],center=true);		
	}
}

module MorganBeltWheel2(){
	difference(){
		MorganBeltWheel();
		translate([0,0,-1])			// Only widen pipe section
			polyhole(50,Drive_pipe_OD);
		
		translate([0,0,25])
			rotate([90,0,0])
				cylinder(r=2, h=40, center=true);
		
	}
}

module MorganLineWheel2(){
	difference(){
		MorganLineWheel();
		translate([0,0,-1])			// Only widen pipe section
			polyhole(50,Drive_pipe_OD);
		
		translate([0,0,25])
			rotate([90,0,0])
				cylinder(r=2, h=40, center=true);
	
	}
}


module MorganBeltWheel()
{
	difference(){	
		union(){
			// The Wheel itself
			cylinder(r1 = 77, r2 = 67, h=10, $fn=100);
			cylinder(r1 = 67, r2= 77, h=10, $fn=100);
			translate([0,0,1.5])
				cylinder(r=75, h=7, $fn = 100);

			for (sector = [0:3]){
				rotate([0,30,sector*90 - 45])
					translate([10,0,18])
						cube([20,5,8],center=true);
			}		 
		}
	
		for (sector = [0:3]){
			rotate([0,0,sector*90]){
				translate([44,0,-0.5])
					//cylinder(r=25,h=10,$fn=100);
					polyhole(11,50);
				translate([42,42,-0.5])
					//cylinder(r=10,h=10,$fn=100);
					polyhole(11,20);

				translate([-1.75,60,1.5])
					cube([3.5,20,7]);

			}	
		}
		//cylinder(r=8,h=10);
		polyhole(10,16);

		
		// Magnet hole 5mm
		for (maghole = [0:7]){
			rotate([0,0,maghole*360/8+22.5])
			//rotate([0,0,155-40])
				translate([71,0,7])
					polyhole(30,5);
		}				
	}

	Fastener_stack();
}

module MorganLineWheel()
{
	difference(){	
		union(){
			// The Wheel itself
			cylinder(r1 = 77, r2 = 75, h=2, $fn=100);
			translate([0,0,3])
				cylinder(r1 = 75, r2= 77, h=2, $fn=100);
			translate([0,0,1.5])
				cylinder(r=75, h=3, $fn = 100);

			for (sector = [0:3]){
				rotate([0,30,sector*90 - 45])
					translate([10,0,14])
						cube([20,5,8],center=true);


			}

		 
		}
	
		translate([0,0,-5])
			cylinder(r=80, h=5);

		for (sector = [0:3]){
			rotate([0,0,sector*90]){
				translate([44,0,-0.5])
					//cylinder(r=25,h=10,$fn=100);
					polyhole(11,50);
				translate([42,42,-0.5])
					//cylinder(r=10,h=10,$fn=100);
					polyhole(11,20);

				translate([-1.75,60,1.5])
					cube([3.5,20,2]);

			}	
		}
		//cylinder(r=8,h=10);
		polyhole(10,16);

		
		// Magnet hole 5mm
		for (maghole = [0:7]){
			rotate([0,0,maghole*360/8+22.5])
			//rotate([0,0,155-40])
				translate([71,0,2])
					polyhole(30,5);
		}				
	}

	Fastener_stack();
}

module MorganPillar()
{
	difference(){
		union(){
			cylinder(r=12.5,h=27,$fn=100);
			cylinder(r=14.5,h=20);


		}
		translate([0,0,-1])
			polyhole(h=32, d=22*PipeFactor);

	}
}

module MorganPillarMount()
{
	difference(){
		union(){
			translate([0,0,1])
				minkowski(){	
					cube([30,30,2], center=true);
					cylinder(r=10,h=1);
				}
			cylinder(r=22,h=10, $fn=100);
		}
		translate([0,0,-1])
				polyhole(12,35);

		translate([0,0,3])
			polyhole(8,37);

		for (sign1 = [1,-1]){
			for (sign2 = [1,-1]){
				translate([sign1*19,sign2*19,-1])
					polyhole(5,4);
			}
		}
		
	}
}

module MorganShaftMount()
{
	difference(){
		union(){
			translate([0,0,1])
				minkowski(){	
					cube([30,30,2], center=true);
					cylinder(r=10,h=1);
				}
			cylinder(r=16,h=10, $fn=100);
		}
		translate([0,0,-1])
			polyhole(12,20);

		translate([0,0,3])
			polyhole(8,22);

		translate([0,0,8.5])
			polyhole(8,25);			

		for (sign1 = [1,-1]){
			for (sign2 = [1,-1]){
				translate([sign1*19,sign2*19,-1])
					polyhole(5,4);
			}
		}
		
	}
}

module MorganSRodMount(rodsize = 8)
{
	difference(){
		union(){
			translate([0,0,1.5])
				minkowski(){	
					union(){
						rotate([0,0,45])
							translate([-8,0,0])
								cube([rodsize,1,3], center=true);
						rotate([0,0,-45])
							translate([-8,0,0])
								cube([rodsize,1,3], center=true);
					}
					cylinder(r=6,h=.0001);
				}
			cylinder(r=rodsize/2 +4,h=10, $fn=100);
		}
		translate([0,0,3])
			polyhole(8,rodsize);

		for (sign1 = [1,-1]){
			for (sign2 = [1,-1]){
				translate([sign1*(5+rodsize/2),sign2*(5+rodsize/2),-1])
					polyhole(5,4);
			}
		}
		
	}
}

module MorganZmountTop(rodspacing = 175, rodsize = 8) // Default morgan dimentions
{
  difference(){
	union(){	
		rotate([0,0,45])
			MorganPillarMount();	

		translate([-rodspacing/2,0,0])
			MorganSRodMount(rodsize);	
		translate([rodspacing/2,0,0])
			rotate([0,0,180])	
				MorganSRodMount(rodsize);

		translate([-rodspacing/3.5,0,1.5])
			cube([rodspacing/2.5,16,3], center=true);
		translate([rodspacing/3.5,0,1.5])
			cube([rodspacing/2.5,16,3], center=true);
	}
  

		translate([0,27,4])
			cube([50,10,10],center=true);
  }

}

module MorganZmountBot(rodspacing = 175, rodsize = 8) // Default morgan dimentions
{

 difference(){
  union(){		
	rotate([0,0,45])
		MorganShaftMount();	

	translate([-rodspacing/2,0,0])
			MorganSRodMount(rodsize);	
		translate([rodspacing/2,0,0])
			rotate([0,0,180])	
				MorganSRodMount(rodsize);

	translate([-rodspacing/3.5,0,1.5])
			cube([rodspacing/2.5,16,3], center=true);
		translate([rodspacing/3.5,0,1.5])
			cube([rodspacing/2.5,16,3], center=true);
   }

		translate([0,27,4])
			cube([50,10,10], center = true);
 }

}

module SupportCylinder(r1, r2, h,  slice = 0.4)
{
	union()
	{
		scale(2){
			for (radius = [r1/2:r2/2]){
				difference(){
					cylinder(r = radius, h/2, $fn = 50);
					cylinder(r = radius - (slice/2), h/2, $fn = 50);
				}
			}
		}
		cylinder(r = r2, h=slice, $fn = 50);
		translate([0,0,h])
			cylinder(r = r2, h=slice, $fn = 50);
	}
}

module Bearing_recess (){		// Single recess
	intersection(){
		union(){
		
			//polyhole(12,22);
		//}
		//translate([0,0,-4])
			polyhole(9,22);
			cylinder(r1=12, r2=10, h=4);	
		}	
		cylinder (r1 = 20, r2=8, h=10);
	}
}

module Bearing_group (){			// Top and bottom
	translate([0,0,-1])
		union(){
			Bearing_recess();
			//cylinder(r=9,h=50);
			polyhole(50,20);
		}	
		translate([0,0,41])
			rotate([0,180,0])
				Bearing_recess();

}

module Bearing_stack()
{
	difference(){
		cylinder(r=15, h=40);	
		Bearing_group();
	}
}



module Extruder_Bowden_adaptor(support = true)
{
	//union(){
	difference(){
		union(){
			translate([-11,11,15])
				difference(){
					import("lib/Base_and_Riser_2.stl");
					cube([50,50,40], center = true);
			}
			
			cylinder(r=15.8/2,h=35, $fn = 50);	
		}
			
		translate([0,0,-1])	
		union(){
			cylinder(r=4,h=80, $fn=36);
		}
		translate([0,0,4.76])	
			difference(){
					
				cylinder(r=(15.8/2), h=4.64, $fn = 50);		
				translate([0,0,4.64 - 2])	
					cylinder(r1=6, r2 = 15.8/2, h=2, $fn = 50);	
				cylinder(r=12/2, h=4.64, $fn=50);
			}
	}

	//SupportCylinder (r1 = 5, r2 = 7, h=10);

	
}


module Fastener_stack()
{
	difference(){
		cylinder(r=15, h=40);
		translate([0,0,-1])
			//linear_extrude(height = 42)
				nutHole(8);//, proj = 1);

		translate([0,0,6])
			polyhole(42, 7.9);
			//cylinder(r=7.5, h=42, $fn=6);

		translate([0,0,34])
			//linear_extrude(height = 42)
				nutHole(8);//, proj = 1);

	}
}

module BeamProfile(){
	beamr = 13;
	intersection(){	
		translate([beamr-beamr*.4,0,0])
			//circle(r=beamr);
			projection()
				rotate([0,90,0])
					teardrop(beamr, 1, 90);

		translate([0,-beamr,0])
			square([beamr*2,beamr*2]);
	}
}


module SupBeamProfile(){
	beamr = 13;
	translate([3.5,0,0])
		square([7,beamr*2-7],center=true);
	translate([3.5,9,0])
		circle(r=3.5,$fn=20);
	translate([3.5,-9,0])
		circle(r=3.5,$fn=20);
}

module BeamCross(){

	rotate([0,0,180]){
		difference(){
			BeamProfile();
			translate([2.5,0,0])	
				scale(.8)	
					BeamProfile();	
		}
	}
}

module SupBeamCross(){

	rotate([0,0,180])
		SupBeamProfile();
}

module Beam(StackRadius = 13, BeamLength = 150){
	difference(){
		union(){
			rotate([0,90,0])
				linear_extrude(height = BeamLength)
					BeamCross();
			translate([BeamLength/2,8,13])
				rotate([180,0,0])
					teardrop(3.5, BeamLength, 90);
			translate([BeamLength/2,10,9.5])
				rotate([180,0,0])
					teardrop(2.5, BeamLength, 90);


			translate([BeamLength/2,-8,13])
				rotate([180,0,0])
					teardrop(3.5, BeamLength, 90);
			translate([BeamLength/2,-10,9.5])
				rotate([180,0,0])
					teardrop(2.5, BeamLength, 90);

		}

		cylinder(r=StackRadius, h=40, $fn=50);
		translate([BeamLength,0,0])
			cylinder(r=StackRadius, h=40, $fn = 50);
		translate([20,0,0])
			cylinder(r=4,h=40);
		translate([BeamLength-20,0,0])
			cylinder(r=4,h=40);
	}
}


module SupBeam(){
	difference(){
		rotate([0,90,0])
			linear_extrude(height = 150)
				SupBeamCross();
		cylinder(r=13, h=40);
		translate([150,0,0])
			cylinder(r=13, h=40);
	}
}	



module Primary_Arm(){
	
	Beam();

	difference(){
		Bearing_stack();
		rotate([0,45,0])
					cube([1,30,1],center=true);
	}	

	translate([150,0,0])
		difference(){
			Fastener_stack();
			rotate([0,45,0])
					cube([1,30,1],center=true);
		}

}

module Secondary_Arm(){
	difference(){
		union(){
			Beam(StackRadius = 29/2);

			translate([150,0,0])
				Fastener_stack();

			// Flat area for 90deg calibration - Set square
			translate([150*.75, 12.5, 5])
				cube([75,5,10], center=true);

			
			
		}
	
		translate([-3,8,13])
			rotate([0,90,0])
				cylinder(r=1.5, h=45, $fn = 10);

		translate([-3,-8,13])
			rotate([0,90,0])
				cylinder(r=1.5, h=45, $fn = 10);
		translate([150,0,0])
			rotate([0,45,0])
					cube([1,30,1],center=true);

		translate([0,0,22])
			cylinder(r=20, h=10);
	}
	
}
//translate([50,0,0])
//	linear_extrude(height = 110)
//		nutHole(4);
//Hotend_stack();

module Hotend_stack(Hotend_D = 16.2, Hotend_H = 10, Mount_H = 12)
{
	difference(){
		union(){
			//translate([-11,11,Hotend_H-17])
				//difference(){
					//import("lib/Base_and_Riser_2.stl");
					//cube([50,50,14], center = true);
				//}
			
			cylinder(r=30/2, h=14 + Mount_H, $fn=50);
			cylinder(r=27/2, h=15 + Mount_H, $fn = 50);
			if ((2 + Hotend_H) > (23 + Mount_H)){
				translate([-11,11,Hotend_H-17])
				difference(){
					import("lib/Base_and_Riser_2.stl");
					cube([50,50,14], center = true);
				}
				cylinder(r=25/2, h=2 + Hotend_H, $fn = 50);
			}
			else{
				translate([-11,11,5 + Mount_H])
				difference(){
					import("lib/Base_and_Riser_2.stl");
					cube([50,50,14], center = true);
				}
				cylinder(r=25/2, h=23 + Mount_H, $fn = 50);
			}
			
			/*linear_extrude(height = 23 + Hotend_H)
				projection(cut=true)
					translate([-11,11,-10])
						import("lib/Base_and_Riser_2.stl"); */
			//cylinder(r=Hotend_D/2 -2, h=23 + Hotend_H, $fn = 50);	
		}
			
		translate([0,0,-1])	
		union(){
			cylinder(r=Hotend_D/2,h=Hotend_H, $fn = 50);		// Mounting Hole for Hotend
			//translate([0,0,Hotend_H])
			//	cylinder(r=1.5, h=5, $fn=36);
			translate([0,0,Hotend_H])
				cylinder(r=3, h=8, $fn=36);
			translate([0,0,Hotend_H+8])
				cylinder(r1=3,r2 = 3.9,h=16, $fn=36);
		}

		rotate([0,45,0])
			cube([1,30,1],center=true);		
	}

	
}

//Hotend_stack_2();

module Hotend_stack_2(Hotend_D = 16.2, Hotend_H = 12, Mount_H = Hotend_H)
{
	difference(){
		union(){
			translate([-11,11,5 + Hotend_H])
				difference(){
					import("lib/Base_and_Riser_2.stl");
					cube([50,50,14], center = true);
			}
			
			cylinder(r=30/2, h=12 + Hotend_H, $fn=50);
			//cylinder(r=27/2, h=15 + Hotend_H, $fn = 50);
			//cylinder(r=25/2, h=23 + Hotend_H, $fn = 50);	
		}
			
		translate([0,0,-1])	
		union(){
			cylinder(r=Hotend_D/2,h=Hotend_H+3, $fn = 50);		// Mounting Hole for Hotend
			//translate([0,0,Hotend_H])
			//	cylinder(r=1.5, h=5, $fn=36);
			translate([0,0,Hotend_H])
				cylinder(r=3, h=8, $fn=36);
			translate([0,0,Hotend_H+8])
				cylinder(r1=3,r2 = 3.9,h=16, $fn=36);
		}

		rotate([0,45,0])
			cube([1,30,1],center=true);		
	}

	
}

module Secondary_Arm_hotend_holder(Hotend_D = 16.2, Hotend_H = 12){
	difference(){
		
		union(){
			Hotend_stack(Hotend_D = Hotend_D, Hotend_H = Hotend_H);
			// mounting piece
			difference(){
				translate([13,0,Hotend_H-1])
					cube([8,12,20],center = true);
				
				translate([17,0,Hotend_H-10])
					rotate([0,45,0])
						cube([12,12,12],center = true);
			}
		}
		
	
		union(){

		// Arm mounting holes with "drop" openings
		translate([-3,8,Hotend_H+3])
			rotate([0,90,0])
				cylinder(r=2, h=45, $fn = 10);
		translate([-6,8,Hotend_H+3])
			rotate([0,90,0])
				cylinder(r=3.5, r2 = 2, h=3, $fn = 10);
		translate([-16,8,Hotend_H+3])
			rotate([0,90,0])
				cylinder(r=4,h=10, $fn = 50);
		translate([-11,8,Hotend_H+5.828])
			rotate([45,0,0])
				cube([10,4,4], center = true);

		
		translate([-3,-8,Hotend_H+3])
			rotate([0,90,0])
				cylinder(r=2, h=45, $fn = 10);
		translate([-6,-8,Hotend_H+3])
			rotate([0,90,0])
				cylinder(r=3.5, r2 = 2, h=3, $fn = 10);
		
		translate([-16,-8,Hotend_H+3])
			rotate([0,90,0])
				cylinder(r=4,h=10, $fn = 50);
		translate([-11,-8,Hotend_H+5.828])
			rotate([45,0,0])
				cube([10,4,4], center = true);
	
		// mounting holes for J-Head

		translate([6,20,Hotend_H-7])
			rotate([90,0,0])
				cylinder(r=1.5, h=40, $fn = 10);
		translate([-6,20,Hotend_H-7])
			rotate([90,0,0])
				cylinder(r=1.5, h=40, $fn = 10);

		// Subtract the beam
		translate([0,0,Hotend_H-10])
			Beam(StackRadius = 30/2);

		// M4 inner section  for 1.75 filament support
		translate([0,0,0])
			linear_extrude(h=400)
				projection()
					nutHole(4, tolerance = 0.5);
		}
	}
	//SupportCylinder (r1 = 2, r2 = 7, h=10);
	translate([0,0,Hotend_H-1])
		cylinder(r=Hotend_D / 2, h=.4);
}

module Secondary_Arm_hotend_holder_2(Hotend_D = 16.2, Hotend_H = 12){
	difference(){
		
		union(){
			Hotend_stack_2(Hotend_D = Hotend_D, Hotend_H = Hotend_H);
			// mounting piece
			difference(){
				translate([13,0,Hotend_H+2])
					#cube([9,12,20],center = true);
				
				translate([17,0,Hotend_H-12])
					rotate([0,45,0])
						cube([12,12,15],center = true);
			}
		}
		
	
		union(){

	
		// mounting holes for J-Head

		translate([6,20,Hotend_H-7])
			rotate([90,0,0])
				cylinder(r=1.5, h=40, $fn = 10);
		translate([-6,20,Hotend_H-7])
			rotate([90,0,0])
				cylinder(r=1.5, h=40, $fn = 10);

		// Subtract the beam
		//translate([0,0,Hotend_H-10])
			//Beam(StackRadius = 30/2);

		// M4 inner section  for 1.75 filament support
		translate([0,0,0])
			linear_extrude(h=400)
				projection()
					nutHole(4, tolerance = 0.5);
		}
	}
	//SupportCylinder (r1 = 2, r2 = 7, h=10);
	translate([0,0,Hotend_H-1+3])
		cylinder(r=Hotend_D / 2, h=.4);
}

module Secondary_Arm_hotend_holder_mk2(Hotend_D = 16.2, Hotend_H = 12,Mount_H = 12, mountpiece = true){
	difference(){
		
		union(){
			Hotend_stack(Hotend_D = Hotend_D, Hotend_H = Hotend_H, Mount_H = Mount_H);
			// mounting piece
			if (mountpiece){
				difference(){
					translate([13,0,Mount_H-1])
						cube([8,12,20],center = true);
				
					translate([17,0,Mount_H-10])
						rotate([0,45,0])
							cube([12,13,12],center = true);
				}
			}
		}
		
	
		union(){

		// Arm mounting holes with "drop" openings
		translate([-3,8,Mount_H+3])
			rotate([0,90,0])
				cylinder(r=2, h=45, $fn = 10);
		translate([-6,8,Mount_H+3])
			rotate([0,90,0])
				cylinder(r=3.5, r2 = 2, h=3, $fn = 10);
		translate([-16,8,Mount_H+3])
			rotate([0,90,0])
				cylinder(r=4,h=10, $fn = 50);
		translate([-11,8,Mount_H+5.828])
			rotate([45,0,0])
				cube([10,4,4], center = true);

		
		translate([-3,-8,Mount_H+3])
			rotate([0,90,0])
				cylinder(r=2, h=45, $fn = 10);
		translate([-6,-8,Mount_H+3])
			rotate([0,90,0])
				cylinder(r=3.5, r2 = 2, h=3, $fn = 10);
		
		translate([-16,-8,Mount_H+3])
			rotate([0,90,0])
				cylinder(r=4,h=10, $fn = 50);
		translate([-11,-8,Mount_H+5.828])
			rotate([45,0,0])
				cube([10,4,4], center = true);
	
		// mounting holes for J-Head

		translate([6,20,Hotend_H-7])
			rotate([90,0,0])
				cylinder(r=1.5, h=40, $fn = 10);
		translate([-6,20,Hotend_H-7])
			rotate([90,0,0])
				cylinder(r=1.5, h=40, $fn = 10);

		// Subtract the beam
		translate([0,0,Mount_H-10])
			Beam(StackRadius = 30/2);

		// M4 inner section  for 1.75 filament support
		translate([0,0,0])
			linear_extrude(h=400)
				projection()
					nutHole(4, tolerance = 0.5);
		}
	}
	//SupportCylinder (r1 = 2, r2 = 7, h=10);
	translate([0,0,Hotend_H-1])
		cylinder(r=Hotend_D / 2, h=.4);
}

module Sup_Arm1(){

	intersection(){
		union(){
			

			difference(){
				union(){
					SupBeam();
					cylinder(r=30/2, h=7, $fn = 50);
				}
				//cylinder(r=22/2, h=7, $fn = 50);
				translate([0,0,-1])
					polyhole(10,22);
				rotate([0,45,0])
					cube([1,30,1],center=true);
			}			

			//translate([150,0,0])
			//	Fastener_stack();
		}
		translate([-50,-25,0])
			cube([250,50,7]);
	}
	translate([150,0,0])
		difference(){
			cylinder(r=30/2, h=30, $fn = 50);
			translate([0,0,-1])
				polyhole(32, Drive_pipe_OD);
			//cylinder(r=22/2, h=30, $fn = 50);
			translate([0,0,20])
				rotate([90,0,0])
					cylinder(r=2,h=40, center=true);
			rotate([0,45,0])
					cube([1,30,1],center=true);
		}	
		
}

module Sup_Arm2(){

	intersection(){
		union(){
			

			difference(){
				union(){
					SupBeam();
					cylinder(r=45/2, h=7, $fn = 50);
				}
				cylinder(r=37/2, h=7, $fn = 50);
				rotate([0,45,0])
					cube([1,50,1],center=true);
			}			

			translate([150,0,0])
				difference(){
					Fastener_stack();
					rotate([0,45,0])
						cube([1,30,1],center=true);
				}
		}
		translate([-50,-25,0])
			cube([250,50,7]);
	}

	difference(){
				cylinder(r=45/2, h=10, $fn = 50);
				translate([0,0,8])
					cylinder(r1=37/2, r2=35/2, h=1, $fn=50);
				cylinder(r=35/2,h=10, $fn=50);
				cylinder(r=37/2, h=8, $fn = 50);
				rotate([0,45,0])
					cube([1,50,1],center=true);
	}	
}


motorshaft = 5;
motorshaftlenght = 15;
nutdiameter = 6;
nutheight = 3;
grubdiameter = 3;

leadscrewshaft = 7.5;
leadscrewshaftlenght = 13;
couplertopdiameter = 22;

//leadscrew_profile();


module MorganZCoupler ()
{
	couplheight = motorshaftlenght+leadscrewshaftlenght+2;

	difference(){
		union(){
			cylinder(r=couplertopdiameter/2, h=couplheight);
			intersection(){
				translate([0,0,(couplheight*.75+5)/2])
					cube([couplertopdiameter,couplertopdiameter,couplheight*.75+5],center=true);
				cylinder(r1 = couplertopdiameter/1.45, r2=couplertopdiameter/2, h=couplheight*.75);
			}
		}

		if (Leadnut_thread){
			intersection(){
				rotate([180,0,0])
					linear_extrude(height = 120/4, center = true, twist = -360)
						scale(1.1)
							leadscrew_profile();
				translate([0,0,-1])
					polyhole (leadscrewshaftlenght+1,leadscrewshaft+2);
			}
		} else {
			translate([0,0,-1])
					polyhole (leadscrewshaftlenght+1,leadscrewshaft);
		}
		translate([0,0,(leadscrewshaftlenght-1)/2 -1 ])
			cube([2,couplertopdiameter+1,leadscrewshaftlenght],center=true);

		translate([0,0,leadscrewshaftlenght+2])
			polyhole(motorshaftlenght+1,motorshaft);

		for (i=[0:2]){
			rotate([0,0,i*(360/3)])
				translate([0,0,couplheight - (motorshaftlenght*.3)])
					rotate([0,90,0]){
						polyhole(couplertopdiameter, grubdiameter);
						
						translate([0,0,couplertopdiameter/5])
							for(j=[0:2])
								translate([-grubdiameter*j,0,0])//{
									scale(1.1)
										nutHole(3);
									//translate([0,0,-0.5])
										//nutHole(3);					
								//}
					}

		}
		for (k=[-1,1])
			translate([-couplertopdiameter/2+2,k*(0.5+(leadscrewshaft/2)+grubdiameter/2),4])
				rotate([0,90,0]){
					translate([0,0,-1])
						polyhole(couplertopdiameter,3);
					boltHole(3,lenght=30);
					translate([0,0,couplertopdiameter-5])
						scale([1.05,1.05,1.5]) #nutHole(3);
				}
		
	}


}
